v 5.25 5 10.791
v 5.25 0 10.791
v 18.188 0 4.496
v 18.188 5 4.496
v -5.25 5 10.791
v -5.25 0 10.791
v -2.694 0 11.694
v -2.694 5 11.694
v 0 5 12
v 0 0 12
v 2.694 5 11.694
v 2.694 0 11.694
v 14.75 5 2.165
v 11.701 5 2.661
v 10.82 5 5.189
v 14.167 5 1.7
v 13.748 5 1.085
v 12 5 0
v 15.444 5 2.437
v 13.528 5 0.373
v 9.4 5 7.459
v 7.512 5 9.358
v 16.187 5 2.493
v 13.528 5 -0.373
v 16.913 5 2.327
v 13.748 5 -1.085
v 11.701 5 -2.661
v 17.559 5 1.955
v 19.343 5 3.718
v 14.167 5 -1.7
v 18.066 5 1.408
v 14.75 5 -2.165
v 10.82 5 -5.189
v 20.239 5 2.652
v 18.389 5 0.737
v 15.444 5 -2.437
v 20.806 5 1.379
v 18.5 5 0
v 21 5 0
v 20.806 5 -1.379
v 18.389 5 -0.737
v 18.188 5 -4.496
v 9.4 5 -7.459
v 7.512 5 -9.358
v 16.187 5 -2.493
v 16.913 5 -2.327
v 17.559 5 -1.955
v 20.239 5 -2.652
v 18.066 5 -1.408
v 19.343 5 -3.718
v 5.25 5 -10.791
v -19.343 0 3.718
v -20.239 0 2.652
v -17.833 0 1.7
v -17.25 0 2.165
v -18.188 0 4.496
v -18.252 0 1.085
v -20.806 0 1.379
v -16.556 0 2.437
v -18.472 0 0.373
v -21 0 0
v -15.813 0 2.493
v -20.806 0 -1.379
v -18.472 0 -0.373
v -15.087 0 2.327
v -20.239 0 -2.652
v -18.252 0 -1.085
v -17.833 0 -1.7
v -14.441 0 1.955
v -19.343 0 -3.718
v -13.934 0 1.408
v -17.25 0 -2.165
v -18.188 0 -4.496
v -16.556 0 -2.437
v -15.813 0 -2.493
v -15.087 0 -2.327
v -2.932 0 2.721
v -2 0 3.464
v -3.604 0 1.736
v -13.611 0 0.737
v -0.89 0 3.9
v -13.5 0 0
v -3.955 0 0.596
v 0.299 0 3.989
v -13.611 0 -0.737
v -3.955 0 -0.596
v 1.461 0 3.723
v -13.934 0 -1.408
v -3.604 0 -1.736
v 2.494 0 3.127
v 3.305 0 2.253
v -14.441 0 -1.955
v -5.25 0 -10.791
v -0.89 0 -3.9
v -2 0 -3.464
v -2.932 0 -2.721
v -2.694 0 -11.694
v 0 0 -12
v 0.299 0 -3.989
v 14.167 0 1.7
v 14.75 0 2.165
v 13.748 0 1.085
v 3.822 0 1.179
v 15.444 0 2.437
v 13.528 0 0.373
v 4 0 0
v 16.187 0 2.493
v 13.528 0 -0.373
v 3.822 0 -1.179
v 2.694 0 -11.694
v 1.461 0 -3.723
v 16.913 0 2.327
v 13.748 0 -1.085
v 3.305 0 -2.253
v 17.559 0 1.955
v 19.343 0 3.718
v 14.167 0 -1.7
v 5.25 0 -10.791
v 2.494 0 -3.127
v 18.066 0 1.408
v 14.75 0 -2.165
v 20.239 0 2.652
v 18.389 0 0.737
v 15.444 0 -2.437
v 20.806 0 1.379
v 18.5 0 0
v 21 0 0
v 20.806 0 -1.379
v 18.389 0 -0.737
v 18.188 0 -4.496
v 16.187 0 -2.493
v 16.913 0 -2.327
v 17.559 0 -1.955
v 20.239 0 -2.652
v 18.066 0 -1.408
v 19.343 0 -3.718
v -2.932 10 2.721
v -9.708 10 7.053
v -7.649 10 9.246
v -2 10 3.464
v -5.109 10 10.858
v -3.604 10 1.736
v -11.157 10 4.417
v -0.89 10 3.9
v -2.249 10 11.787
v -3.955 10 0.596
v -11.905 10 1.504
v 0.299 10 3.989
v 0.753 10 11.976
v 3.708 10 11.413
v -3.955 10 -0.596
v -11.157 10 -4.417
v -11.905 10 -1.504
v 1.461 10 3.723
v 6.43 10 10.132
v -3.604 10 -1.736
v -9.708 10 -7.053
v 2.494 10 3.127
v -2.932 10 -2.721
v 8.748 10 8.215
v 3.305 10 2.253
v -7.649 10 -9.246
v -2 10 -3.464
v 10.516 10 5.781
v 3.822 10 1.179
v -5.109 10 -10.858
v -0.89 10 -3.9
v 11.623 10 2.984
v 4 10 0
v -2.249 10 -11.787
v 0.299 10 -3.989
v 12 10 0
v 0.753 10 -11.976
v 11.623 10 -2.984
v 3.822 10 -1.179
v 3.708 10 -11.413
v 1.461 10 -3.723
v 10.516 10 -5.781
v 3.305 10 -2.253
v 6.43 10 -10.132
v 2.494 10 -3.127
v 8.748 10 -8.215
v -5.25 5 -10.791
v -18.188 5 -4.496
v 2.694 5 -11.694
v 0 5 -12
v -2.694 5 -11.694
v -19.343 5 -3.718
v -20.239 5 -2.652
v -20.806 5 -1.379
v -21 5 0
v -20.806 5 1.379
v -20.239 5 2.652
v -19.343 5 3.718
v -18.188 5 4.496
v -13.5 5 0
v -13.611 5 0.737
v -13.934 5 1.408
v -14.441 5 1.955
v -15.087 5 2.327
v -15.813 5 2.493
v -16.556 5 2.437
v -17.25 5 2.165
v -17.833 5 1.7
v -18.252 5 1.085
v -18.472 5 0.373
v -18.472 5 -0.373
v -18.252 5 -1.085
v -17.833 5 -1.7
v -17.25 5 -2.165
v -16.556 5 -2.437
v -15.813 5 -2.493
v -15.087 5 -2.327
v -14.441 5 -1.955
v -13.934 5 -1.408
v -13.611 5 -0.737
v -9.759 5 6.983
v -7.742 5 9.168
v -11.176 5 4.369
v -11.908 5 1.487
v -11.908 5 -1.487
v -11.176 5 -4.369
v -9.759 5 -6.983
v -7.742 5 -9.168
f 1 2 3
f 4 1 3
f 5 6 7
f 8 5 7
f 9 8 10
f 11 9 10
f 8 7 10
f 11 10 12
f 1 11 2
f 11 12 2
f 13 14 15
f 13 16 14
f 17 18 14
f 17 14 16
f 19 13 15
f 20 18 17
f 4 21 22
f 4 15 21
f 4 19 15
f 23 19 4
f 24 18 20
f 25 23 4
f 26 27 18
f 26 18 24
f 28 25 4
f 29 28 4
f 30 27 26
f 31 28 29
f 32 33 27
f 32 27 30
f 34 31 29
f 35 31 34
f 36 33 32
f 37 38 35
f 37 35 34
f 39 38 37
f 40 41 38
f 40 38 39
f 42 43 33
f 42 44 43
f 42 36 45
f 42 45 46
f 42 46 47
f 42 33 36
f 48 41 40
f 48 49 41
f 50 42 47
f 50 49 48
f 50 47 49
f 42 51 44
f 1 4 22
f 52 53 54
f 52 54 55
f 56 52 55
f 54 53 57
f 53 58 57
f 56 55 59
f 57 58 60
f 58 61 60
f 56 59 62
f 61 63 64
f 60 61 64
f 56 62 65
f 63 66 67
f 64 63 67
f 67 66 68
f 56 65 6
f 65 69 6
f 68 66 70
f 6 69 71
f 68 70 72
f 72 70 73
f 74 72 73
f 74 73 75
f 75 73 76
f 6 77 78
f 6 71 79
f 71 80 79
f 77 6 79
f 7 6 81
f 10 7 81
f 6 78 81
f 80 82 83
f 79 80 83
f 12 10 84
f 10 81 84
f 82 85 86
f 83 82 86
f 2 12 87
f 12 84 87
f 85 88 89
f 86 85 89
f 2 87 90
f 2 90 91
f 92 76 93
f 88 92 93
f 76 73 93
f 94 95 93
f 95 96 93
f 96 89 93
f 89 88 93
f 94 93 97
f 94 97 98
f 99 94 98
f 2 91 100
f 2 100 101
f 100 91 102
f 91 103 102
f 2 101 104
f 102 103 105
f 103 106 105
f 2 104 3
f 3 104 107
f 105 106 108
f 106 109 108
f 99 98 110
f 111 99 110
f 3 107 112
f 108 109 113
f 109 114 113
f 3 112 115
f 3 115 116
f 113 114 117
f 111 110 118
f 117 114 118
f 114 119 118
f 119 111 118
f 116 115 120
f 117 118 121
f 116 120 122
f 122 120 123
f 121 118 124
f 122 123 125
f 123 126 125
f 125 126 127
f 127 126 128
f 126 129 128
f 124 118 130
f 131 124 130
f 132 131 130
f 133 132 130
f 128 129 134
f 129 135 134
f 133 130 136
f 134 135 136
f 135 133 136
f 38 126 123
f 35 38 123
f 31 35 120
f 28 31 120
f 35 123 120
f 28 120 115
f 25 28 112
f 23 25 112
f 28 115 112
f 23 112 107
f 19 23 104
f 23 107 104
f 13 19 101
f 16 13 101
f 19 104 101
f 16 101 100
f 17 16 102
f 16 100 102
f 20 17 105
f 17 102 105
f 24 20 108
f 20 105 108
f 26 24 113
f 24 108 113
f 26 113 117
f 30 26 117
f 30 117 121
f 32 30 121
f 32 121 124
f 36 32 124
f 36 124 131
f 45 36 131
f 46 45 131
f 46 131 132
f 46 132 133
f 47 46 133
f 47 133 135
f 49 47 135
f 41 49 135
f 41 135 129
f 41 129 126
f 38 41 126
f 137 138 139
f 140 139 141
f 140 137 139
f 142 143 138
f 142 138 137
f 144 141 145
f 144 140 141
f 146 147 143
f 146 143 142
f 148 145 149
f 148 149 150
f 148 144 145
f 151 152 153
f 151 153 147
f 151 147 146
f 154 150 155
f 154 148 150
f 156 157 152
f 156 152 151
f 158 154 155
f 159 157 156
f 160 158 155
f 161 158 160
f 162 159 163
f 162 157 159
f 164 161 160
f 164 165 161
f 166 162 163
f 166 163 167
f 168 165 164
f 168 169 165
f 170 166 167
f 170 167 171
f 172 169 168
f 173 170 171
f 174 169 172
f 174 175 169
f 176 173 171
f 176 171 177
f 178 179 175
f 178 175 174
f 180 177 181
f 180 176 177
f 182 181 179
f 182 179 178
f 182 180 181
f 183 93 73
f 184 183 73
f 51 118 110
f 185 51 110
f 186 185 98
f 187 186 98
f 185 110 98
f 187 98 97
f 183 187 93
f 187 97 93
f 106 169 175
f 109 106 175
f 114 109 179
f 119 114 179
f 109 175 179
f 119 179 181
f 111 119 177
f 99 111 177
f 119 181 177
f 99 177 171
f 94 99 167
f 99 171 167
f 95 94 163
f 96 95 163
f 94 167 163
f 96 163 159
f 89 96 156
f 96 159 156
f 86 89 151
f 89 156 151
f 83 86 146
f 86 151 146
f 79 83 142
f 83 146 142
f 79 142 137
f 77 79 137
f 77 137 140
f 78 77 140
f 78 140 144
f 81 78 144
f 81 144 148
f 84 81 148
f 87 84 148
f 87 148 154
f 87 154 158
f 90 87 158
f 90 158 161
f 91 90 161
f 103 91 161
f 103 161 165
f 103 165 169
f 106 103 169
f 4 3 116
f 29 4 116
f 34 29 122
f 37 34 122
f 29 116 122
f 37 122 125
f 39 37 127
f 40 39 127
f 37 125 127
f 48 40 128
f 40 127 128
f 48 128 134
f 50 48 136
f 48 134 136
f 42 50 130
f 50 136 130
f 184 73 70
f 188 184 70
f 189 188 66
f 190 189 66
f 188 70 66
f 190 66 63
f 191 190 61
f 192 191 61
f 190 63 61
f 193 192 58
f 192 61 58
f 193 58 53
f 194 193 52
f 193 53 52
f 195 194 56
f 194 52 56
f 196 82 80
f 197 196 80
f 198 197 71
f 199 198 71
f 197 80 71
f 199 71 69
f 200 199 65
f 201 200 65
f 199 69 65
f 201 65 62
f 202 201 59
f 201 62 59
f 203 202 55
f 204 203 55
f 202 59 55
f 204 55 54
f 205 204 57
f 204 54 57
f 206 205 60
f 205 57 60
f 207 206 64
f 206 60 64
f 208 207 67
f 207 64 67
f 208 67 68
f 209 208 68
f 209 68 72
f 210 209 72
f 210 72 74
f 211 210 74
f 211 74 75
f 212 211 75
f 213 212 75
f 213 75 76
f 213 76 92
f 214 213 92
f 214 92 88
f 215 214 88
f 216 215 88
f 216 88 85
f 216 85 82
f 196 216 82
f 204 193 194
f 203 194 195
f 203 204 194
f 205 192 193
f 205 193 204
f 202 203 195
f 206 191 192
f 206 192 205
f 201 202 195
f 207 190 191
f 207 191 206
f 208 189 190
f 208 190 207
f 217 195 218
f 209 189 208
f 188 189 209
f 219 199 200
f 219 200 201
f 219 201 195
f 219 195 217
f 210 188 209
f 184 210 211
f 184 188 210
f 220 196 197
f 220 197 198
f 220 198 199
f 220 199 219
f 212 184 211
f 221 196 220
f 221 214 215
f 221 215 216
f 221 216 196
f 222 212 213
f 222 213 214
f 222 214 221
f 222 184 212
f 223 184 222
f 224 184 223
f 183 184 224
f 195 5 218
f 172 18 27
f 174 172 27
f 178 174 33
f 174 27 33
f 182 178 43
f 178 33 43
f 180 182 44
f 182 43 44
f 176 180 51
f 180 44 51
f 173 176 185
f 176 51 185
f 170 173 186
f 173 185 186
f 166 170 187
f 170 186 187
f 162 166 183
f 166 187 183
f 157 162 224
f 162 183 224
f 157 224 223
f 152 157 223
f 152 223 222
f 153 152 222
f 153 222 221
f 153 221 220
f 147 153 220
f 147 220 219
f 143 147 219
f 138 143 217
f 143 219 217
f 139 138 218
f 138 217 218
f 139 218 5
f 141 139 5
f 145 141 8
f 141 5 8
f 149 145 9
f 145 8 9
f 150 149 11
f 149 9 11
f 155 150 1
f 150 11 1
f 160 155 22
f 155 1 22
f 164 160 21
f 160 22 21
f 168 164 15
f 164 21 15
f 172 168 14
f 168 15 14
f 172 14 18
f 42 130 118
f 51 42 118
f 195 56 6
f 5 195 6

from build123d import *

# Parameters (mm, degrees)
EXTRUDE_1_DEPTH     = 5
SKETCH_3_R          = 12
EXTRUDE_2_DEPTH     = 5
SKETCH_4_R          = 4
CUT_EXTRUDE_1_DEPTH = 11
SKETCH_6_R          = 2.5
CUT_EXTRUDE_2_DEPTH = 11


with BuildPart() as part:
    # 草图1 → 凸台-拉伸1 (new body)
    with BuildSketch(Plane(origin=(0, 0, 0), x_dir=(1, 0, 0), z_dir=(0, 1, 0))):
        with BuildLine():
            Line((-5.25, 10.790620927), (-18.1875, 4.496092053))
            ThreePointArc((-18.1875, 4.496092053), (-21, 0), (-18.1875, -4.496092053))
            Line((-18.1875, -4.496092053), (-5.25, -10.790620927))
            ThreePointArc((-5.25, -10.790620927), (0, -12), (5.25, -10.790620927))
            Line((5.25, -10.790620927), (18.1875, -4.496092053))
            ThreePointArc((18.1875, -4.496092053), (21, 0), (18.1875, 4.496092053))
            Line((18.1875, 4.496092053), (5.25, 10.790620927))
            ThreePointArc((5.25, 10.790620927), (0, 12), (-5.25, 10.790620927))
        make_face()
    extrude(amount=EXTRUDE_1_DEPTH)

    # 草图3 → 凸台-拉伸2 (add)
    with BuildSketch(Plane(origin=(0, 5, 0), x_dir=(1, 0, 0), z_dir=(0, 1, 0))):
        Circle(SKETCH_3_R)
    extrude(amount=EXTRUDE_2_DEPTH)

    # 草图4 → 切除-拉伸1 (cut, through all)
    with BuildSketch(Plane(origin=(0, 10, 0), x_dir=(1, 0, 0), z_dir=(0, 1, 0))):
        Circle(SKETCH_4_R)
    extrude(amount=-CUT_EXTRUDE_1_DEPTH, mode=Mode.SUBTRACT)

    # 草图6 → 切除-拉伸2 (cut, through all)
    with BuildSketch(Plane.XZ):
        with Locations((-16, 0)):
            Circle(SKETCH_6_R)
        with Locations((16, 0)):
            Circle(SKETCH_6_R)
    extrude(amount=-CUT_EXTRUDE_2_DEPTH, mode=Mode.SUBTRACT)


solid = part.part
